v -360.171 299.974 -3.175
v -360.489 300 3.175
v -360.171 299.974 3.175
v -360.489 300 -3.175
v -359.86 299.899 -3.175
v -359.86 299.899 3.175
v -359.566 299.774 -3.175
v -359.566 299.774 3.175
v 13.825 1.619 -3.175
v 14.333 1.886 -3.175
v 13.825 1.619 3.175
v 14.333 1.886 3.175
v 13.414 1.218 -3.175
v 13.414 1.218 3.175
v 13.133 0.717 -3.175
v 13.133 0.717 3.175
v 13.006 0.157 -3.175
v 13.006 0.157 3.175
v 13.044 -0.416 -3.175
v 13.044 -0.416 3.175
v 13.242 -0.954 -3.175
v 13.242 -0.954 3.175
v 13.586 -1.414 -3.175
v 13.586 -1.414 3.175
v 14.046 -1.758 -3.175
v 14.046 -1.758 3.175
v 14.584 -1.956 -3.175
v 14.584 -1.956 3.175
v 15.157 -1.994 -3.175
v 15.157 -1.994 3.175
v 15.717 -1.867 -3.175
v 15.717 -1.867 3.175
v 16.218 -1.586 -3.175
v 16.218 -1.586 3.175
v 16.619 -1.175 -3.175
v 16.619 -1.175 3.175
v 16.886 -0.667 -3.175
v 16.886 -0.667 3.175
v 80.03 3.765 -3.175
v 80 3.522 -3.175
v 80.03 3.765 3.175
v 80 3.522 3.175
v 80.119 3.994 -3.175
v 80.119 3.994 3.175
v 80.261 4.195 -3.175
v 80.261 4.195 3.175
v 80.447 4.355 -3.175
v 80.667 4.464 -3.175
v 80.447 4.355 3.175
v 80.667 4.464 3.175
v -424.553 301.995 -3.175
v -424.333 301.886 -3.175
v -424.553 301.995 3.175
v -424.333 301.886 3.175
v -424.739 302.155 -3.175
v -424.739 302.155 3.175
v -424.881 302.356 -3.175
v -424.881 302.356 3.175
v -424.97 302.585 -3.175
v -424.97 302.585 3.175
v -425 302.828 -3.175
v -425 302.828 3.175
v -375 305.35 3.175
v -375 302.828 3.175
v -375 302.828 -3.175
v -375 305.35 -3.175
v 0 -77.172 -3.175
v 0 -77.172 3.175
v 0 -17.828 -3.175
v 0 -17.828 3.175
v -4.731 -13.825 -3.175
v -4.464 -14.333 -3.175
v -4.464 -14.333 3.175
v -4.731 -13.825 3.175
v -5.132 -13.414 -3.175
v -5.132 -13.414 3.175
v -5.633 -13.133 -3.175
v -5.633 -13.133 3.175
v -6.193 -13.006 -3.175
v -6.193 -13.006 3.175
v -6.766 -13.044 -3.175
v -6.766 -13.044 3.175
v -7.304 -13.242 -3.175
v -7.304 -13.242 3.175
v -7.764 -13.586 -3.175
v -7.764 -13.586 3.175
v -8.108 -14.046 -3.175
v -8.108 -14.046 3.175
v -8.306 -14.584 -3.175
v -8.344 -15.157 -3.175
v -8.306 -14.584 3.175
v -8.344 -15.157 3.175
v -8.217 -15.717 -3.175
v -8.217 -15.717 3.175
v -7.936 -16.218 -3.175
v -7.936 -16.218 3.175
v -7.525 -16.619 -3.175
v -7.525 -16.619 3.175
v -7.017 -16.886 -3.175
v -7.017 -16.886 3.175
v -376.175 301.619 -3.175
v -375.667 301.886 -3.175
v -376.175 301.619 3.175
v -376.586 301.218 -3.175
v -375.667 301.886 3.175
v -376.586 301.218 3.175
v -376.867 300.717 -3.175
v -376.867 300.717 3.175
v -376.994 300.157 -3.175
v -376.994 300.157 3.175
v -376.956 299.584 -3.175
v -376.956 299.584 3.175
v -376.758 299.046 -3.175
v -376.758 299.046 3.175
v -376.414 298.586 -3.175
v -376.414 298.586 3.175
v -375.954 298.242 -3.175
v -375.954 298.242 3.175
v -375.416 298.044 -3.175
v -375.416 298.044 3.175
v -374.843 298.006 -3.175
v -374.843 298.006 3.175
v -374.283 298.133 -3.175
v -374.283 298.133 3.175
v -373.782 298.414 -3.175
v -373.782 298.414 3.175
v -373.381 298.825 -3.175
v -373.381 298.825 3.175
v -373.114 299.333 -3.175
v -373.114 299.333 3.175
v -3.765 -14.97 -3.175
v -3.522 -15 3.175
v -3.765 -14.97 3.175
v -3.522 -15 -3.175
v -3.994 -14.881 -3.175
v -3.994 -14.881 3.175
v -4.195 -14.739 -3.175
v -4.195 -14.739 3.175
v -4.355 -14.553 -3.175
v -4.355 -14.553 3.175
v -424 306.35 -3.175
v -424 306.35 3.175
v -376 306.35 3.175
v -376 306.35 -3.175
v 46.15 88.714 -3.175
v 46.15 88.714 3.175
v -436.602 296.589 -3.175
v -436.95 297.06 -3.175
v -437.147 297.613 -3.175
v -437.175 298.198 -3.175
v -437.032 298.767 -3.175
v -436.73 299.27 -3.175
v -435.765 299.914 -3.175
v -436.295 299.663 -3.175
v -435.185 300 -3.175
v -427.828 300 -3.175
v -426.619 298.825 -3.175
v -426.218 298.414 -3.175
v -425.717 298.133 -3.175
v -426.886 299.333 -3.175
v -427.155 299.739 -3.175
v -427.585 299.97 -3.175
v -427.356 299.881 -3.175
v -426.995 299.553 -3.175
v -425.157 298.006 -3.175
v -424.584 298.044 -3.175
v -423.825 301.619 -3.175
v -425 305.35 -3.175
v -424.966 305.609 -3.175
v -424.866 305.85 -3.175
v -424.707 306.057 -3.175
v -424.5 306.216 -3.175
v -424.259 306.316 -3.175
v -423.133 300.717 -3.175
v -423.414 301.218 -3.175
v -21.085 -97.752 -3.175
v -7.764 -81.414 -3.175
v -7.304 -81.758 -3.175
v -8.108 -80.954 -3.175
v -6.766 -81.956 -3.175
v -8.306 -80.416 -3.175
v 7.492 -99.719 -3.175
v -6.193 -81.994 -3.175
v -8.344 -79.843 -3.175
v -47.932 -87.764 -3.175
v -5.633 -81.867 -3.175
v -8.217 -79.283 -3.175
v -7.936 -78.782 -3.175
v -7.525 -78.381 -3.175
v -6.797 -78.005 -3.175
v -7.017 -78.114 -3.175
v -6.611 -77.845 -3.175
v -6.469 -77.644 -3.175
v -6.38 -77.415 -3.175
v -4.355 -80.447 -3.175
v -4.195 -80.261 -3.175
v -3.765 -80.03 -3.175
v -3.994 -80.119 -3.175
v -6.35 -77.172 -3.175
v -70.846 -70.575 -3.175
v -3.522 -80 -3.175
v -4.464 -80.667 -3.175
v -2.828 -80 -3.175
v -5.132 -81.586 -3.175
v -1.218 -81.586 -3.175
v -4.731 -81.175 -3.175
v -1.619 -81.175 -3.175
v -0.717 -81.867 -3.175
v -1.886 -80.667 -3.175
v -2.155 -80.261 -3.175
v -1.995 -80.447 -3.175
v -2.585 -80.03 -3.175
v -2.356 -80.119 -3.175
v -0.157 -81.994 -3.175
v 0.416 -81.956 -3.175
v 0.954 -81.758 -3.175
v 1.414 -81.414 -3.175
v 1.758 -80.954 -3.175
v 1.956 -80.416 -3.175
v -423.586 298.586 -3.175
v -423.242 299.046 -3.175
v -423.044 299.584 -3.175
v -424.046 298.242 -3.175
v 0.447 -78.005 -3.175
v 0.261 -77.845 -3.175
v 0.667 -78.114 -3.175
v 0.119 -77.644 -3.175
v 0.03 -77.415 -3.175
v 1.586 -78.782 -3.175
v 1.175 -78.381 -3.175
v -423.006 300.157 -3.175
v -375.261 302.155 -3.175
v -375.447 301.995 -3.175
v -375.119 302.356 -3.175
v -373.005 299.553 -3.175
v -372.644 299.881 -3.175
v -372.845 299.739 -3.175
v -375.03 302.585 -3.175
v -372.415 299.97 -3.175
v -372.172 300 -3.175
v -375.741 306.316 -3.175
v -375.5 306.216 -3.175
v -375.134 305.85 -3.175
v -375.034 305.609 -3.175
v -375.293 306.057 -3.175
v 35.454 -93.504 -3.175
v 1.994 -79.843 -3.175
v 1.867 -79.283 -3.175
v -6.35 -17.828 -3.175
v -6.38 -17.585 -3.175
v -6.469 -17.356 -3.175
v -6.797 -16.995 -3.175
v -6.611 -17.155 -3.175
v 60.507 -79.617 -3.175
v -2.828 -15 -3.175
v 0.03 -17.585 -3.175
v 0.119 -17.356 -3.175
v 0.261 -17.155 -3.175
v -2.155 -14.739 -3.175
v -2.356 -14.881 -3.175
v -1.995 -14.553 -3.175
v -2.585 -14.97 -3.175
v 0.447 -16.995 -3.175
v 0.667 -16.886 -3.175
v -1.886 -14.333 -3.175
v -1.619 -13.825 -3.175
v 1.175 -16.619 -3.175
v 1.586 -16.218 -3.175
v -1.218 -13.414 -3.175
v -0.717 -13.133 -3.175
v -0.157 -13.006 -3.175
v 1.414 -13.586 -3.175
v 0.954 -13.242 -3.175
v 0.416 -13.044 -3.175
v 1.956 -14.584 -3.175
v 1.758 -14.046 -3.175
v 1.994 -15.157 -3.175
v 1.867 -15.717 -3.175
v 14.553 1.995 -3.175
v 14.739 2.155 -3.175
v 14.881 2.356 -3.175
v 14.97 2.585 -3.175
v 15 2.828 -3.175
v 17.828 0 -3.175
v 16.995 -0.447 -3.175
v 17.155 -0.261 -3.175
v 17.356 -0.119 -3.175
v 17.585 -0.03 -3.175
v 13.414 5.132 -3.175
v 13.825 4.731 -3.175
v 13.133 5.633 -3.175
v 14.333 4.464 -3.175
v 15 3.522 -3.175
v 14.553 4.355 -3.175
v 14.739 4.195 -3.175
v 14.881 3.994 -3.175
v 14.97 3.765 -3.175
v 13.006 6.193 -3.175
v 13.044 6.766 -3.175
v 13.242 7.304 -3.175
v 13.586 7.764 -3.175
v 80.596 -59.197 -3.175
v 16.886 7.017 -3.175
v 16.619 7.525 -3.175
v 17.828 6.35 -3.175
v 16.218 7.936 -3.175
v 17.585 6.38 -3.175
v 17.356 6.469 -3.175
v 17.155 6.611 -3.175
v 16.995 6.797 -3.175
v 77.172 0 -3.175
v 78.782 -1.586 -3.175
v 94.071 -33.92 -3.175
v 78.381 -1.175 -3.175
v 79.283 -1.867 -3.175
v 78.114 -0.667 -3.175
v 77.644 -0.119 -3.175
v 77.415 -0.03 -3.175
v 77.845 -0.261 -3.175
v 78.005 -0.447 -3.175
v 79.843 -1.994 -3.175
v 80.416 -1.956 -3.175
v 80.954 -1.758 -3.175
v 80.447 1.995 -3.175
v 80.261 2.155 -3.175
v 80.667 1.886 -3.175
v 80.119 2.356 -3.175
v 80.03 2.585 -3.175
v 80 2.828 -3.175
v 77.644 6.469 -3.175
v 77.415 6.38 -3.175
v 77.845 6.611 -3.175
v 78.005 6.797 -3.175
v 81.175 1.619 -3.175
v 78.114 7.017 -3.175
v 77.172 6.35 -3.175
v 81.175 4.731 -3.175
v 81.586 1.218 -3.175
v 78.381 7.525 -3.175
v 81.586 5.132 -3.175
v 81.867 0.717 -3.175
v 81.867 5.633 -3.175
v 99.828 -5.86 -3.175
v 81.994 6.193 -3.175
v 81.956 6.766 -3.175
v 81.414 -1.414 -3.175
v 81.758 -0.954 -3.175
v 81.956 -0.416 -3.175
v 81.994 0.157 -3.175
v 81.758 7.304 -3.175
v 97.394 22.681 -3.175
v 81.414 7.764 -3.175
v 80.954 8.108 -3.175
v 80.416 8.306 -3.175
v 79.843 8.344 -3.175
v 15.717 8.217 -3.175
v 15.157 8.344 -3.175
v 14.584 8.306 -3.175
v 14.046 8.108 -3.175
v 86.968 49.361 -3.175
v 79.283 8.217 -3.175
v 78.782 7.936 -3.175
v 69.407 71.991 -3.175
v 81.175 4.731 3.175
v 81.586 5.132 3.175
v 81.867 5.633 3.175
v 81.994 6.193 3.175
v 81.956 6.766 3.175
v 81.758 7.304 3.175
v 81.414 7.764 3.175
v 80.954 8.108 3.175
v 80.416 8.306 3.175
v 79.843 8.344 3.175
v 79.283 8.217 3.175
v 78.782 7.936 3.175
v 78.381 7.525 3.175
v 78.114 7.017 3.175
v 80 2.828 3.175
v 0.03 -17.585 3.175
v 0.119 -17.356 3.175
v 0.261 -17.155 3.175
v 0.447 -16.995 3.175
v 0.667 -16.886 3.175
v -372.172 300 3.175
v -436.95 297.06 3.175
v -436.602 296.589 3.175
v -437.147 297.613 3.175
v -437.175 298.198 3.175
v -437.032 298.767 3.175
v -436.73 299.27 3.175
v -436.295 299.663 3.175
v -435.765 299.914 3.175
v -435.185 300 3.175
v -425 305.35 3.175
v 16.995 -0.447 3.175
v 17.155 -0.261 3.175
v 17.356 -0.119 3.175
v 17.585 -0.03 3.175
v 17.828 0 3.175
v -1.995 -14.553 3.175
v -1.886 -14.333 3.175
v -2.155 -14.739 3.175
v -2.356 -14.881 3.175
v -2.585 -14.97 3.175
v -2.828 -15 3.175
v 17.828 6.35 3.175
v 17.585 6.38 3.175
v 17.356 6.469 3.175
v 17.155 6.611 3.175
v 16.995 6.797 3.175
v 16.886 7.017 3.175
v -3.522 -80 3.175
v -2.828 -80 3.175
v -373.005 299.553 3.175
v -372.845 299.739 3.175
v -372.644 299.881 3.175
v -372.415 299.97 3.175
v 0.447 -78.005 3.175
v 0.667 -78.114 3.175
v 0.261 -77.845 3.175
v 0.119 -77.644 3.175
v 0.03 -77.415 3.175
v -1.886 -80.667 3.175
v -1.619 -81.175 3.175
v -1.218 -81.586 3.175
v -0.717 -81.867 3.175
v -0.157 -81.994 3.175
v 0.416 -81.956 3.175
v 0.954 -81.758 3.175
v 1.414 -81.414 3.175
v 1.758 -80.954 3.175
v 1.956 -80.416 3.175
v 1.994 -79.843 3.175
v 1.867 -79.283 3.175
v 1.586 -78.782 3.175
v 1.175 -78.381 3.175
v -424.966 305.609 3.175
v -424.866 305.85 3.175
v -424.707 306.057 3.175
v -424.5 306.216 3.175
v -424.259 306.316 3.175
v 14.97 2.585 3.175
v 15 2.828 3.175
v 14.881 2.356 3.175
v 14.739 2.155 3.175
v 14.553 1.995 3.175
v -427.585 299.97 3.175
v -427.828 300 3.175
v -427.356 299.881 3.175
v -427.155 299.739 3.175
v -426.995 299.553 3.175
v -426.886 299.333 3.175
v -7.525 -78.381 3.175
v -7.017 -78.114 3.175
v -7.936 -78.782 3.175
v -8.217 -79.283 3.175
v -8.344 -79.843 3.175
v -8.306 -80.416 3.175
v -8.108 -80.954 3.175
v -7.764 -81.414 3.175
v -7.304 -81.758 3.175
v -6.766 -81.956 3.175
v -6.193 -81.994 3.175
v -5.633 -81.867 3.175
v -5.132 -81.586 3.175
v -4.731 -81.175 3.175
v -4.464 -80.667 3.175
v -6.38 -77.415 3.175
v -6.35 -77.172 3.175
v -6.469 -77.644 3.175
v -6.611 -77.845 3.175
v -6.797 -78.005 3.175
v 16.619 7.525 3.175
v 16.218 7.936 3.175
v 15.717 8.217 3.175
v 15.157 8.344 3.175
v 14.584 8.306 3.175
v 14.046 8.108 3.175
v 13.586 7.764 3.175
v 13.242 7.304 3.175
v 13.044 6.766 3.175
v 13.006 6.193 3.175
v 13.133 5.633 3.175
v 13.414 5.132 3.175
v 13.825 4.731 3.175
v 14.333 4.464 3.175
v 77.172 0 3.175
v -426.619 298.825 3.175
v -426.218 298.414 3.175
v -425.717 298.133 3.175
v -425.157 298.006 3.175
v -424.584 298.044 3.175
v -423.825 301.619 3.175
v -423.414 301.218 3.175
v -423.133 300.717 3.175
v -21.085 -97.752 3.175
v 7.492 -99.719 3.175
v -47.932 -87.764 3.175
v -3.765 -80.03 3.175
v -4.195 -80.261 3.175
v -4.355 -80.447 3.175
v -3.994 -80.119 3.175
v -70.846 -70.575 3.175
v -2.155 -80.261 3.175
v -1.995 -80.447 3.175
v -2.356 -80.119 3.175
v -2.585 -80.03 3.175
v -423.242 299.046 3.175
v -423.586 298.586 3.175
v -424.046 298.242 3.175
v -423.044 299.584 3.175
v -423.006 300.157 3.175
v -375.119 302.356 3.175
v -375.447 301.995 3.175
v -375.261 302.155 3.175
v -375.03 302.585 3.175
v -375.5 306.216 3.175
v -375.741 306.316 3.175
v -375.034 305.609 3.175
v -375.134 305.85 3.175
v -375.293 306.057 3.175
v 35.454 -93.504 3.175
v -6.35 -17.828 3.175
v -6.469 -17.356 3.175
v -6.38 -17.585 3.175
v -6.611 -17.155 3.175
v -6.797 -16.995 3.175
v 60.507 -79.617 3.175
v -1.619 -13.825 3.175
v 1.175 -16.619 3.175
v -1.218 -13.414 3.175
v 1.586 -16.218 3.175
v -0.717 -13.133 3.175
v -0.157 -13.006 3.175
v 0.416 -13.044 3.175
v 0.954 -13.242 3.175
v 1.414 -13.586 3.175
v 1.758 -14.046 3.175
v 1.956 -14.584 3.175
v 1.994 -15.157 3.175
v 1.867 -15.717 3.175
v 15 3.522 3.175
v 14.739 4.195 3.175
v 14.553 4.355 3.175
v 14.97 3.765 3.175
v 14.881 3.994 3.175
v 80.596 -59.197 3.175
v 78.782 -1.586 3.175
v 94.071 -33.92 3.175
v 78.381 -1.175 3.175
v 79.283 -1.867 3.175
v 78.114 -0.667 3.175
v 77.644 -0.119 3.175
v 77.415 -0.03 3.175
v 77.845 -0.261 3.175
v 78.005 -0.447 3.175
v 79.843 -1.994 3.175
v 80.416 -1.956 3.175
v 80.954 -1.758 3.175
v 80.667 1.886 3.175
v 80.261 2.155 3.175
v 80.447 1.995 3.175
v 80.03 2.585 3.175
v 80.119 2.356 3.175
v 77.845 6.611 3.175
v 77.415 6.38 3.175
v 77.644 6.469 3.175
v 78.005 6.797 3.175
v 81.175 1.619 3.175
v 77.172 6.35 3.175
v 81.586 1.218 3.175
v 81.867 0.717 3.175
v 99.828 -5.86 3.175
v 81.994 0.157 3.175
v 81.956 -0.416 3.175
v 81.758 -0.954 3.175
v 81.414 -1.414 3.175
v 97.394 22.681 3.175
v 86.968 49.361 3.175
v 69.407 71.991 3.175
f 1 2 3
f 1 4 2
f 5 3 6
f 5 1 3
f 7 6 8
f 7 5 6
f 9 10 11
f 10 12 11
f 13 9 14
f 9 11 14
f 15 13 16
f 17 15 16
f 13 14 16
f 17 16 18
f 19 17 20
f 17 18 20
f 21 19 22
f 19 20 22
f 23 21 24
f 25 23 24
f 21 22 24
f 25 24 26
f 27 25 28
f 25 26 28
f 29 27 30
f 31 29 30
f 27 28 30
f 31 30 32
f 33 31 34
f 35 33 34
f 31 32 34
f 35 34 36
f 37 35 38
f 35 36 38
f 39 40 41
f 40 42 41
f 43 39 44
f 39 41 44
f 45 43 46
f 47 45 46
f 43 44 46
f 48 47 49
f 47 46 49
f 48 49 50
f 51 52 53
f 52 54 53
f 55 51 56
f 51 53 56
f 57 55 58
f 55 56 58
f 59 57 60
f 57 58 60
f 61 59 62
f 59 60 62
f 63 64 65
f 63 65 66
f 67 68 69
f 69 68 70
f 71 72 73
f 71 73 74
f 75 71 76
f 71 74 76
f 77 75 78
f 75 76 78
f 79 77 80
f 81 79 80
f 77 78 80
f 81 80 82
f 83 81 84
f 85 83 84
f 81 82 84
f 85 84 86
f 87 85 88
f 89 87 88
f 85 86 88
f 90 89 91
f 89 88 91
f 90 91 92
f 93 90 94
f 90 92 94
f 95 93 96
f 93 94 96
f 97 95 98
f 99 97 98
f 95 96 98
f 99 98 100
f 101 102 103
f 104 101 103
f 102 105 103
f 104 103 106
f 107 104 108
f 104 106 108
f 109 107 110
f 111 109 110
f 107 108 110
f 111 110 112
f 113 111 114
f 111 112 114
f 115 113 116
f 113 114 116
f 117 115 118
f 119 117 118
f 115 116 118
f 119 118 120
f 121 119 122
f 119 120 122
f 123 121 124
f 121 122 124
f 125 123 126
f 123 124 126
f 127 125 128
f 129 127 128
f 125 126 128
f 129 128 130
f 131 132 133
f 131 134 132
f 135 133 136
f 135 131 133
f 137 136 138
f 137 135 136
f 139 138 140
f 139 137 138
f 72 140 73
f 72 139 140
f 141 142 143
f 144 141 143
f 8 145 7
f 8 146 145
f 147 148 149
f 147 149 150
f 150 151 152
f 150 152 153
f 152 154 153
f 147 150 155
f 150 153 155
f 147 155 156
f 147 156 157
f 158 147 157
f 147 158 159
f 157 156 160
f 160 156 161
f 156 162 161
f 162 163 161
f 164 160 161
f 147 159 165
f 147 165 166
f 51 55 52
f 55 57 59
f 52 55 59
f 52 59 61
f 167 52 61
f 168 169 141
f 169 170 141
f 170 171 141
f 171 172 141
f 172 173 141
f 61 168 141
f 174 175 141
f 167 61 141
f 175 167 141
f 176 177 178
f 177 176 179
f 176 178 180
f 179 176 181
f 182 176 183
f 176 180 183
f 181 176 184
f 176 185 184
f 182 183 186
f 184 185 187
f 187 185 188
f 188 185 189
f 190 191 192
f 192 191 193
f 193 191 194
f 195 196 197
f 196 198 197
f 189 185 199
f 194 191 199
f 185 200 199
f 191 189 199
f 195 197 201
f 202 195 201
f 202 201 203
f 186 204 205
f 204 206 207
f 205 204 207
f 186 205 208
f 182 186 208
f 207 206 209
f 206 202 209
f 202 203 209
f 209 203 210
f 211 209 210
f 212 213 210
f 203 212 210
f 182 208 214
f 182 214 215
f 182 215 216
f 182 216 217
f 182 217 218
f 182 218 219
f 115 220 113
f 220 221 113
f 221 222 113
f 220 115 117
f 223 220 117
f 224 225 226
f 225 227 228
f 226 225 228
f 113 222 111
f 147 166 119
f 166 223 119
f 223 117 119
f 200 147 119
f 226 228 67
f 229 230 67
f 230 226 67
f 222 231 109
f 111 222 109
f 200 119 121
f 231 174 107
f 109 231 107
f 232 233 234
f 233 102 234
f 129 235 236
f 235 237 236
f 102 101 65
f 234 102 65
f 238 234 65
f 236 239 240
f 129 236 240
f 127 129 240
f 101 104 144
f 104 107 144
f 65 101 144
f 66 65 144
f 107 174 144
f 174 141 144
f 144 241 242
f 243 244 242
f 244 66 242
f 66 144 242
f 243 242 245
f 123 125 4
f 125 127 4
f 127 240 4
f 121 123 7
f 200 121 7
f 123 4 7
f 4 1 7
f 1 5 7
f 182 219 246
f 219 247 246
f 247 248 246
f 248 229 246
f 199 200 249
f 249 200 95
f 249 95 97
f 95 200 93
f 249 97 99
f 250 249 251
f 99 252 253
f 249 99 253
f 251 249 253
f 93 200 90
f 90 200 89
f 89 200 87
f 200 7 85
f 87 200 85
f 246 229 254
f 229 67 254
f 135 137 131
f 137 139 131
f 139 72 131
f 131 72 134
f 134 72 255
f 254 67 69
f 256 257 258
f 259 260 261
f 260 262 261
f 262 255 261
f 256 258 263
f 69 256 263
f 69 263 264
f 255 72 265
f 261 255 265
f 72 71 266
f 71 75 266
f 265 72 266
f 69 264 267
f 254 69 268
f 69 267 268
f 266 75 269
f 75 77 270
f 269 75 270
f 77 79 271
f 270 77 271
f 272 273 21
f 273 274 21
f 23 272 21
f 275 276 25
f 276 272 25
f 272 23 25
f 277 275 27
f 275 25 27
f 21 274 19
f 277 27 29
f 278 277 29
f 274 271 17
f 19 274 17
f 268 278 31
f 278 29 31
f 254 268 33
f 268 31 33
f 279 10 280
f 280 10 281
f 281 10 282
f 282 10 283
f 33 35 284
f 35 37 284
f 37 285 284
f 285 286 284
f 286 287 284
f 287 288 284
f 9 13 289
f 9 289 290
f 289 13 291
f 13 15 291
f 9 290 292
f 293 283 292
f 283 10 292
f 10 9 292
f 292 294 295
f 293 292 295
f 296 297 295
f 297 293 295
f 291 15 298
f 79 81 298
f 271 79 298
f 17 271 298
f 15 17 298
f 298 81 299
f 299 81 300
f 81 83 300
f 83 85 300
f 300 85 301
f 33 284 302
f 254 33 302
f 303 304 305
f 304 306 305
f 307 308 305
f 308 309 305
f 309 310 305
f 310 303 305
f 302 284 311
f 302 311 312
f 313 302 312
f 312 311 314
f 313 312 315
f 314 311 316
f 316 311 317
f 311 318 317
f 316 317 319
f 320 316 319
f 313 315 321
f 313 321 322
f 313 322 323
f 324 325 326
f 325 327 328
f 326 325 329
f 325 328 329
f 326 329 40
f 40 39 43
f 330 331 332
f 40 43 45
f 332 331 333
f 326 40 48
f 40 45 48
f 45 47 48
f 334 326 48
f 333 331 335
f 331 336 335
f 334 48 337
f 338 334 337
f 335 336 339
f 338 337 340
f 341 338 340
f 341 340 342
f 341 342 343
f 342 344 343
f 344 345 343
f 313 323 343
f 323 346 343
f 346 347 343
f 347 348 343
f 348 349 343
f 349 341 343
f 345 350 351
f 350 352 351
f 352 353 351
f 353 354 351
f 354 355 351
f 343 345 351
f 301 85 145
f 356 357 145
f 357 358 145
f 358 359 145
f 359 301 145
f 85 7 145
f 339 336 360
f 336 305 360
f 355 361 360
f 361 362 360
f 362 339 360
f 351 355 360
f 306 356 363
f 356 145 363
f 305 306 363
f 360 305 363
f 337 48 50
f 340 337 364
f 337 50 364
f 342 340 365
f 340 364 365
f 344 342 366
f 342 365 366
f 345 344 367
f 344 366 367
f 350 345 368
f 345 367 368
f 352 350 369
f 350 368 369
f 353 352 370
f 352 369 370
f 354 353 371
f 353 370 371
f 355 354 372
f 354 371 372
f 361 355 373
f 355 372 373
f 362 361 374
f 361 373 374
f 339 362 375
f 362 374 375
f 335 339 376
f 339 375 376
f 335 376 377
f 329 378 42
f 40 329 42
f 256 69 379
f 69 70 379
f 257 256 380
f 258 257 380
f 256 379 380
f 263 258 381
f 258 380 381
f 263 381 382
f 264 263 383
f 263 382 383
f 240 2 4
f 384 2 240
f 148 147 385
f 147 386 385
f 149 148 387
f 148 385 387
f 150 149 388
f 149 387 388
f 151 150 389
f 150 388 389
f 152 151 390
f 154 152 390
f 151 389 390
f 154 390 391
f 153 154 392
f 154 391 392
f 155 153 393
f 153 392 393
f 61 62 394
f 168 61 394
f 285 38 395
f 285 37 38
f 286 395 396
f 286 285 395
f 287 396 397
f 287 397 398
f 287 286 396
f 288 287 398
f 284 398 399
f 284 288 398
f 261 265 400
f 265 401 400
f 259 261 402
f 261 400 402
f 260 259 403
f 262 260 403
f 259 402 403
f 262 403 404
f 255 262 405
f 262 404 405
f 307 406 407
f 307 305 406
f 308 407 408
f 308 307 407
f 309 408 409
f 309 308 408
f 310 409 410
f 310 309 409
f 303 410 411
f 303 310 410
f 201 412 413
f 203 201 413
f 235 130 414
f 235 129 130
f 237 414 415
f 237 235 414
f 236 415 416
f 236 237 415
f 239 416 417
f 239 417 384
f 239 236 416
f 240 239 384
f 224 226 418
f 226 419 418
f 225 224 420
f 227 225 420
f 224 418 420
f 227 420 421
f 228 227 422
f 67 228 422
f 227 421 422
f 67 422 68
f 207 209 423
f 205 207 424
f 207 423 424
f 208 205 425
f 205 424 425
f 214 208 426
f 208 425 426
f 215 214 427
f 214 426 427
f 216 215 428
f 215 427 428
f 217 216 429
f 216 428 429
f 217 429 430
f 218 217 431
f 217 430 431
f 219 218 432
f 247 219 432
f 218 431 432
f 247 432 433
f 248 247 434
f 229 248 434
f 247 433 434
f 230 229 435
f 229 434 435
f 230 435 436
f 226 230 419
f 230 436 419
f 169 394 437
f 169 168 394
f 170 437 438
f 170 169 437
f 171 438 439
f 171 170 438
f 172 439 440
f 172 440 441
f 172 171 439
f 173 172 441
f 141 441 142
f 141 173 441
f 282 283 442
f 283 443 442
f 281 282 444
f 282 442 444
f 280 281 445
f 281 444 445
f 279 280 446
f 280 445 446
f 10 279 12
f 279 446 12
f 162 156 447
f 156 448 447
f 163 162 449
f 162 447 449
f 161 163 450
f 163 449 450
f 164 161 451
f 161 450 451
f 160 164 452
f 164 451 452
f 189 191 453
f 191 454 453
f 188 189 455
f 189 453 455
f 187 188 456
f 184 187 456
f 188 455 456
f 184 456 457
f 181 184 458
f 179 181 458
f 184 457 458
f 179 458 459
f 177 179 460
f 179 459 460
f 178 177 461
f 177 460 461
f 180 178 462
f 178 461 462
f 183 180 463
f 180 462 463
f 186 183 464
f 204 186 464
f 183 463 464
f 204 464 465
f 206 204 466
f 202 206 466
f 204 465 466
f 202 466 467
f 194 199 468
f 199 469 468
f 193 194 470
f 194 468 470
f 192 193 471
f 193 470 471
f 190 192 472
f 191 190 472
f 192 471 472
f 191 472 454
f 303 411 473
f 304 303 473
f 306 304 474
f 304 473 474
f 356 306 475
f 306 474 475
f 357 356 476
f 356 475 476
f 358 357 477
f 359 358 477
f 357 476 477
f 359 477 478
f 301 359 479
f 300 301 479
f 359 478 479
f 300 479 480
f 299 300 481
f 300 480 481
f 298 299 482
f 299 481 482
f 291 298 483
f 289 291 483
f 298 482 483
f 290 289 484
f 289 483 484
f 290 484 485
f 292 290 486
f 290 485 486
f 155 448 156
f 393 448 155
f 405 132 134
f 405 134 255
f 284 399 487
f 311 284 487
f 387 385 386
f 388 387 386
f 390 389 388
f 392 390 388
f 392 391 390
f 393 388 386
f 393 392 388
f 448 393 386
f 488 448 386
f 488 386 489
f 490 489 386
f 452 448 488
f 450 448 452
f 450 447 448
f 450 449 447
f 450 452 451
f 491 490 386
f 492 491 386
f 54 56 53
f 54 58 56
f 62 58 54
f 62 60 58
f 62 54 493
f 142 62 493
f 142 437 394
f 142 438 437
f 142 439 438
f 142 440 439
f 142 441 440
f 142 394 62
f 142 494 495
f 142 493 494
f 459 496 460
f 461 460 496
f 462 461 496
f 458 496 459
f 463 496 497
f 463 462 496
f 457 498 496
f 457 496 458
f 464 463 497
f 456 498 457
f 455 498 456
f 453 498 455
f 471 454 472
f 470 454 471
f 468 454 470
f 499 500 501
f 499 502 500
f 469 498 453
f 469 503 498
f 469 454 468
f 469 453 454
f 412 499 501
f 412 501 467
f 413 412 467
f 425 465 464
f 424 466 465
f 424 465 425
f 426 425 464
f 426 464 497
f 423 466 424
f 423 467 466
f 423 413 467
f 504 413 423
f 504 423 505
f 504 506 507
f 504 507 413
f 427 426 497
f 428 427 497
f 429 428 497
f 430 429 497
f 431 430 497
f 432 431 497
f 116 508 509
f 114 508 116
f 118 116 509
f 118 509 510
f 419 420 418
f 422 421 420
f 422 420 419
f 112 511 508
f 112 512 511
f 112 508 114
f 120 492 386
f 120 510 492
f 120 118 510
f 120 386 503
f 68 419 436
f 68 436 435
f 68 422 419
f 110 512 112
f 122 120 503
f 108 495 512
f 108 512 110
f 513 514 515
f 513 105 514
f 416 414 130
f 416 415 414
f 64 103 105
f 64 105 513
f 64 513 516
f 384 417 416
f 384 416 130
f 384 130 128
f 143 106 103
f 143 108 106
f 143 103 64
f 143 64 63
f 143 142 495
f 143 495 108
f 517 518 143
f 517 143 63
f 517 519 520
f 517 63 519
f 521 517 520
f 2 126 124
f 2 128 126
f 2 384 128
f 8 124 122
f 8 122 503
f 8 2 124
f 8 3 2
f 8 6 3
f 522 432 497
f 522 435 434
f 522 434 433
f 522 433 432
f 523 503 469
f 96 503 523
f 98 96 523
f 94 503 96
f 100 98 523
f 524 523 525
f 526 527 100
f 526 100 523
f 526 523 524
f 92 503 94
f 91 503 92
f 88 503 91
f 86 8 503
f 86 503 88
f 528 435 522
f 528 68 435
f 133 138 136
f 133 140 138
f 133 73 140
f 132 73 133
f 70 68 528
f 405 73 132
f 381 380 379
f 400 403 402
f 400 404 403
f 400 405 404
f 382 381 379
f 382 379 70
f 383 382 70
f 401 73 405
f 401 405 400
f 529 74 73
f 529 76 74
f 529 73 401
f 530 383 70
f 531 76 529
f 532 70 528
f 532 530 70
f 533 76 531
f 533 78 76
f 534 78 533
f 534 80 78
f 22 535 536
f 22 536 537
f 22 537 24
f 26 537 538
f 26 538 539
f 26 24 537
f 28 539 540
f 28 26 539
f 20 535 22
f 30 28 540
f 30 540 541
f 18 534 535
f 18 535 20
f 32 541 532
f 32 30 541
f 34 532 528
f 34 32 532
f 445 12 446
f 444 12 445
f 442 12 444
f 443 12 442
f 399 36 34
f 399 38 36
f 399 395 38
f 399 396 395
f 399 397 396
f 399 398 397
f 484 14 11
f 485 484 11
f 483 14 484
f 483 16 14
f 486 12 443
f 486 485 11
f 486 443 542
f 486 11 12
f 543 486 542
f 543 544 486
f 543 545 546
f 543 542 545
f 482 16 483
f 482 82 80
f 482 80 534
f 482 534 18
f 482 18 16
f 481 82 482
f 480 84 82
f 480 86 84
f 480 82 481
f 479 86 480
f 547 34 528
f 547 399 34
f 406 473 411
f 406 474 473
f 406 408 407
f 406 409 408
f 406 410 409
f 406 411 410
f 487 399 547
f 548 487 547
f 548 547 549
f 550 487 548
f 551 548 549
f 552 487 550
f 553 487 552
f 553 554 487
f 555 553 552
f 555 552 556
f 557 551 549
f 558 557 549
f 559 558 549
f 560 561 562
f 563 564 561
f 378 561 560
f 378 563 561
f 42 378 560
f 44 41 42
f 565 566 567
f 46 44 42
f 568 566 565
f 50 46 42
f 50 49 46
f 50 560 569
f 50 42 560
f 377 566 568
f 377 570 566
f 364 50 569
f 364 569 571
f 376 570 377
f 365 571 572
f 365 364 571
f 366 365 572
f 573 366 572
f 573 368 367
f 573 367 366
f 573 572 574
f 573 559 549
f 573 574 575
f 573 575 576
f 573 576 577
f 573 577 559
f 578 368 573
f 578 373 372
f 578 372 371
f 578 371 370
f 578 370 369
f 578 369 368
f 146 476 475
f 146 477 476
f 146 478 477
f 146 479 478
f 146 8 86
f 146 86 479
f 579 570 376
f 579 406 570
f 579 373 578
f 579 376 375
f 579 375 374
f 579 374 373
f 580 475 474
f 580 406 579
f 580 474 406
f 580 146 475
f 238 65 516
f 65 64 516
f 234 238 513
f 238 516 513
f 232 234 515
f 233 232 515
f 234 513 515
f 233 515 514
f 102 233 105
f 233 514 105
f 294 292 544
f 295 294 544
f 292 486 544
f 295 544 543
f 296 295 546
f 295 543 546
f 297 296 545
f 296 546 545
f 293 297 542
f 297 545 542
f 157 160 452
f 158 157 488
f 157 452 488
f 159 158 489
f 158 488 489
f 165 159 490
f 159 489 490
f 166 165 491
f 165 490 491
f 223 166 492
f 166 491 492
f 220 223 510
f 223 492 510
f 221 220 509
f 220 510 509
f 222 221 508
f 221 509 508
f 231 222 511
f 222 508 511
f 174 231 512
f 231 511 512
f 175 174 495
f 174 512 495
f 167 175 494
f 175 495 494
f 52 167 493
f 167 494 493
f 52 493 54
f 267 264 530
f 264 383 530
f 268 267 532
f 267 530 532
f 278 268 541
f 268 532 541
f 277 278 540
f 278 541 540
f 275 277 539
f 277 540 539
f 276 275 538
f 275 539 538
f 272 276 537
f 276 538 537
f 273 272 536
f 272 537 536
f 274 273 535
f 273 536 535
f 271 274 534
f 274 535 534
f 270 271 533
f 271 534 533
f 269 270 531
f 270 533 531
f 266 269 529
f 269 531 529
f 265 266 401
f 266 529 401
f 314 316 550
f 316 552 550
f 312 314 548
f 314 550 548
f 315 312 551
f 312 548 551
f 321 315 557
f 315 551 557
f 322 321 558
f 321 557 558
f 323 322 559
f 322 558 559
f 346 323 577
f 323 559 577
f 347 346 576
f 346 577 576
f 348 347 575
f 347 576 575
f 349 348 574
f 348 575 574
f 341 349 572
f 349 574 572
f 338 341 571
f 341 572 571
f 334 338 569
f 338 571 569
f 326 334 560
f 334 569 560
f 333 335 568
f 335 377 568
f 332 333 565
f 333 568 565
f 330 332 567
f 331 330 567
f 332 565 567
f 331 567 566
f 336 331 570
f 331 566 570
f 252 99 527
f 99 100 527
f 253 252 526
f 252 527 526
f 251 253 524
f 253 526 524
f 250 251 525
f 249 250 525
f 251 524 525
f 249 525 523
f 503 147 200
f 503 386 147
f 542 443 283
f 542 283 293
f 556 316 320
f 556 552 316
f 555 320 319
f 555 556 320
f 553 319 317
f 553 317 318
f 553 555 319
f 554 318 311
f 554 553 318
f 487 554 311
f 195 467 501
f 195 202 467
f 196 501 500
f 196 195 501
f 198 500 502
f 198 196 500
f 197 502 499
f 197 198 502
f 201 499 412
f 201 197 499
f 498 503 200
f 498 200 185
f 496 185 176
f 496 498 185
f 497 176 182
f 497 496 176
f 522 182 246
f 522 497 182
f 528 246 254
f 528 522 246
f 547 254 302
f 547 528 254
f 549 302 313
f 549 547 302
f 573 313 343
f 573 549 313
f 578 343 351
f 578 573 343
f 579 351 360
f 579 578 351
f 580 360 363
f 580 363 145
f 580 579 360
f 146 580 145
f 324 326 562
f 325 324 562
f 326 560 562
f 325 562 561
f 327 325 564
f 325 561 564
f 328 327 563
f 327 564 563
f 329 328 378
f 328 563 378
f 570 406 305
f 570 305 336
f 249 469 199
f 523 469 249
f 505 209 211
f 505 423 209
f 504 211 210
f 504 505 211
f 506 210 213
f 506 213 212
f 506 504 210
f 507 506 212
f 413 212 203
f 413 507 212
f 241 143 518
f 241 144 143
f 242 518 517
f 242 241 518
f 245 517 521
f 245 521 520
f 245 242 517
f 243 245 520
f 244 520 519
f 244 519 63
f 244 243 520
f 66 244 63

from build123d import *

# Parameters (mm, degrees)
SKETCH1_W           = 6.35
SKETCH1_H           = 65
SKETCH1_W_2         = 65
SKETCH1_H_2         = 6.35
BOSS_EXTRUDE1_DEPTH = 3.175
SKETCH2_W           = 50
SKETCH2_H           = 6.35
BOSS_EXTRUDE2_DEPTH = 6.35
SKETCH3_R           = 2
CUT_EXTRUDE1_DEPTH  = 7.35
FILLET1_R           = 1
SKETCH4_R           = 2
CUT_EXTRUDE2_DEPTH  = 7.35
FILLET2_R           = 1
FILLET3_R           = 2


with BuildPart() as part:
    # Sketch1 → Boss-Extrude1 (new body, symmetric)
    with BuildSketch(Plane.XY):
        with BuildLine():
            Line((-360, 300), (-440, 300))
            Line((-440, 300), (-70.846389974, -70.574705296))
            ThreePointArc((-70.846389974, -70.574705296), (80.595787705, -59.197288825), (46.150399684, 88.713812955))
            Line((46.150399684, 88.713812955), (-360, 300))
        make_face()
        with Locations((-3.175, -47.5)):
            Rectangle(SKETCH1_W, SKETCH1_H, mode=Mode.SUBTRACT)
        with Locations((47.5, 3.175)):
            Rectangle(SKETCH1_W_2, SKETCH1_H_2, mode=Mode.SUBTRACT)
    extrude(amount=BOSS_EXTRUDE1_DEPTH, both=True)

    # Sketch2 → Boss-Extrude2 (add)
    with BuildSketch(Plane.XY.offset(3.175)):
        with Locations((-400, 303.175)):
            Rectangle(SKETCH2_W, SKETCH2_H)
    extrude(amount=-BOSS_EXTRUDE2_DEPTH)

    # Sketch3 → Cut-Extrude1 (cut, through all)
    with BuildSketch(Plane.XY.offset(3.175)):
        with Locations((-6.35, -15)):
            Circle(SKETCH3_R)
        with Locations((0, -15)):
            Circle(SKETCH3_R)
        with Locations((-6.35, -80)):
            Circle(SKETCH3_R)
        with Locations((0, -80)):
            Circle(SKETCH3_R)
        with Locations((15, 0)):
            Circle(SKETCH3_R)
        with Locations((15, 6.35)):
            Circle(SKETCH3_R)
        with Locations((80, 6.35)):
            Circle(SKETCH3_R)
        with Locations((80, 0)):
            Circle(SKETCH3_R)
    extrude(amount=-CUT_EXTRUDE1_DEPTH, mode=Mode.SUBTRACT)

    # Fillet1
    fillet1_edges = [part.edges().sort_by_distance(p)[0] for p in [
        (17, 6.35, 0),
        (80, 4.35, 0),
        (78, 0, 0),
        (-6.35, -17, 0),
        (15, 4.35, 0),
        (15, 2, 0),
        (78, 6.35, 0),
        (80, 2, 0),
        (-4.35, -15, 0),
        (-2, -15, 0),
        (0, -78, 0),
        (-4.35, -80, 0),
        (17, 0, 0),
        (-2, -80, 0),
        (-6.35, -78, 0),
        (0, -17, 0),
    ]]
    fillet(fillet1_edges, radius=FILLET1_R)

    # Sketch4 → Cut-Extrude2 (cut, through all)
    with BuildSketch(Plane.XY.offset(3.175)):
        with Locations((-425, 300)):
            Circle(SKETCH4_R)
        with Locations((-375, 300)):
            Circle(SKETCH4_R)
    extrude(amount=-CUT_EXTRUDE2_DEPTH, mode=Mode.SUBTRACT)

    # Fillet2
    fillet2_edges = [part.edges().sort_by_distance(p)[0] for p in [
        (-375, 302, 0),
        (-425, 302, 0),
        (-427, 300, 0),
        (-373, 300, 0),
        (-425, 306.35, 0),
        (-375, 306.35, 0),
    ]]
    fillet(fillet2_edges, radius=FILLET2_R)

    # Fillet3
    fillet3_edges = [part.edges().sort_by_distance(p)[0] for p in [
        (-440, 300, 0),
        (-360, 300, 0),
    ]]
    fillet(fillet3_edges, radius=FILLET3_R)


solid = part.part
